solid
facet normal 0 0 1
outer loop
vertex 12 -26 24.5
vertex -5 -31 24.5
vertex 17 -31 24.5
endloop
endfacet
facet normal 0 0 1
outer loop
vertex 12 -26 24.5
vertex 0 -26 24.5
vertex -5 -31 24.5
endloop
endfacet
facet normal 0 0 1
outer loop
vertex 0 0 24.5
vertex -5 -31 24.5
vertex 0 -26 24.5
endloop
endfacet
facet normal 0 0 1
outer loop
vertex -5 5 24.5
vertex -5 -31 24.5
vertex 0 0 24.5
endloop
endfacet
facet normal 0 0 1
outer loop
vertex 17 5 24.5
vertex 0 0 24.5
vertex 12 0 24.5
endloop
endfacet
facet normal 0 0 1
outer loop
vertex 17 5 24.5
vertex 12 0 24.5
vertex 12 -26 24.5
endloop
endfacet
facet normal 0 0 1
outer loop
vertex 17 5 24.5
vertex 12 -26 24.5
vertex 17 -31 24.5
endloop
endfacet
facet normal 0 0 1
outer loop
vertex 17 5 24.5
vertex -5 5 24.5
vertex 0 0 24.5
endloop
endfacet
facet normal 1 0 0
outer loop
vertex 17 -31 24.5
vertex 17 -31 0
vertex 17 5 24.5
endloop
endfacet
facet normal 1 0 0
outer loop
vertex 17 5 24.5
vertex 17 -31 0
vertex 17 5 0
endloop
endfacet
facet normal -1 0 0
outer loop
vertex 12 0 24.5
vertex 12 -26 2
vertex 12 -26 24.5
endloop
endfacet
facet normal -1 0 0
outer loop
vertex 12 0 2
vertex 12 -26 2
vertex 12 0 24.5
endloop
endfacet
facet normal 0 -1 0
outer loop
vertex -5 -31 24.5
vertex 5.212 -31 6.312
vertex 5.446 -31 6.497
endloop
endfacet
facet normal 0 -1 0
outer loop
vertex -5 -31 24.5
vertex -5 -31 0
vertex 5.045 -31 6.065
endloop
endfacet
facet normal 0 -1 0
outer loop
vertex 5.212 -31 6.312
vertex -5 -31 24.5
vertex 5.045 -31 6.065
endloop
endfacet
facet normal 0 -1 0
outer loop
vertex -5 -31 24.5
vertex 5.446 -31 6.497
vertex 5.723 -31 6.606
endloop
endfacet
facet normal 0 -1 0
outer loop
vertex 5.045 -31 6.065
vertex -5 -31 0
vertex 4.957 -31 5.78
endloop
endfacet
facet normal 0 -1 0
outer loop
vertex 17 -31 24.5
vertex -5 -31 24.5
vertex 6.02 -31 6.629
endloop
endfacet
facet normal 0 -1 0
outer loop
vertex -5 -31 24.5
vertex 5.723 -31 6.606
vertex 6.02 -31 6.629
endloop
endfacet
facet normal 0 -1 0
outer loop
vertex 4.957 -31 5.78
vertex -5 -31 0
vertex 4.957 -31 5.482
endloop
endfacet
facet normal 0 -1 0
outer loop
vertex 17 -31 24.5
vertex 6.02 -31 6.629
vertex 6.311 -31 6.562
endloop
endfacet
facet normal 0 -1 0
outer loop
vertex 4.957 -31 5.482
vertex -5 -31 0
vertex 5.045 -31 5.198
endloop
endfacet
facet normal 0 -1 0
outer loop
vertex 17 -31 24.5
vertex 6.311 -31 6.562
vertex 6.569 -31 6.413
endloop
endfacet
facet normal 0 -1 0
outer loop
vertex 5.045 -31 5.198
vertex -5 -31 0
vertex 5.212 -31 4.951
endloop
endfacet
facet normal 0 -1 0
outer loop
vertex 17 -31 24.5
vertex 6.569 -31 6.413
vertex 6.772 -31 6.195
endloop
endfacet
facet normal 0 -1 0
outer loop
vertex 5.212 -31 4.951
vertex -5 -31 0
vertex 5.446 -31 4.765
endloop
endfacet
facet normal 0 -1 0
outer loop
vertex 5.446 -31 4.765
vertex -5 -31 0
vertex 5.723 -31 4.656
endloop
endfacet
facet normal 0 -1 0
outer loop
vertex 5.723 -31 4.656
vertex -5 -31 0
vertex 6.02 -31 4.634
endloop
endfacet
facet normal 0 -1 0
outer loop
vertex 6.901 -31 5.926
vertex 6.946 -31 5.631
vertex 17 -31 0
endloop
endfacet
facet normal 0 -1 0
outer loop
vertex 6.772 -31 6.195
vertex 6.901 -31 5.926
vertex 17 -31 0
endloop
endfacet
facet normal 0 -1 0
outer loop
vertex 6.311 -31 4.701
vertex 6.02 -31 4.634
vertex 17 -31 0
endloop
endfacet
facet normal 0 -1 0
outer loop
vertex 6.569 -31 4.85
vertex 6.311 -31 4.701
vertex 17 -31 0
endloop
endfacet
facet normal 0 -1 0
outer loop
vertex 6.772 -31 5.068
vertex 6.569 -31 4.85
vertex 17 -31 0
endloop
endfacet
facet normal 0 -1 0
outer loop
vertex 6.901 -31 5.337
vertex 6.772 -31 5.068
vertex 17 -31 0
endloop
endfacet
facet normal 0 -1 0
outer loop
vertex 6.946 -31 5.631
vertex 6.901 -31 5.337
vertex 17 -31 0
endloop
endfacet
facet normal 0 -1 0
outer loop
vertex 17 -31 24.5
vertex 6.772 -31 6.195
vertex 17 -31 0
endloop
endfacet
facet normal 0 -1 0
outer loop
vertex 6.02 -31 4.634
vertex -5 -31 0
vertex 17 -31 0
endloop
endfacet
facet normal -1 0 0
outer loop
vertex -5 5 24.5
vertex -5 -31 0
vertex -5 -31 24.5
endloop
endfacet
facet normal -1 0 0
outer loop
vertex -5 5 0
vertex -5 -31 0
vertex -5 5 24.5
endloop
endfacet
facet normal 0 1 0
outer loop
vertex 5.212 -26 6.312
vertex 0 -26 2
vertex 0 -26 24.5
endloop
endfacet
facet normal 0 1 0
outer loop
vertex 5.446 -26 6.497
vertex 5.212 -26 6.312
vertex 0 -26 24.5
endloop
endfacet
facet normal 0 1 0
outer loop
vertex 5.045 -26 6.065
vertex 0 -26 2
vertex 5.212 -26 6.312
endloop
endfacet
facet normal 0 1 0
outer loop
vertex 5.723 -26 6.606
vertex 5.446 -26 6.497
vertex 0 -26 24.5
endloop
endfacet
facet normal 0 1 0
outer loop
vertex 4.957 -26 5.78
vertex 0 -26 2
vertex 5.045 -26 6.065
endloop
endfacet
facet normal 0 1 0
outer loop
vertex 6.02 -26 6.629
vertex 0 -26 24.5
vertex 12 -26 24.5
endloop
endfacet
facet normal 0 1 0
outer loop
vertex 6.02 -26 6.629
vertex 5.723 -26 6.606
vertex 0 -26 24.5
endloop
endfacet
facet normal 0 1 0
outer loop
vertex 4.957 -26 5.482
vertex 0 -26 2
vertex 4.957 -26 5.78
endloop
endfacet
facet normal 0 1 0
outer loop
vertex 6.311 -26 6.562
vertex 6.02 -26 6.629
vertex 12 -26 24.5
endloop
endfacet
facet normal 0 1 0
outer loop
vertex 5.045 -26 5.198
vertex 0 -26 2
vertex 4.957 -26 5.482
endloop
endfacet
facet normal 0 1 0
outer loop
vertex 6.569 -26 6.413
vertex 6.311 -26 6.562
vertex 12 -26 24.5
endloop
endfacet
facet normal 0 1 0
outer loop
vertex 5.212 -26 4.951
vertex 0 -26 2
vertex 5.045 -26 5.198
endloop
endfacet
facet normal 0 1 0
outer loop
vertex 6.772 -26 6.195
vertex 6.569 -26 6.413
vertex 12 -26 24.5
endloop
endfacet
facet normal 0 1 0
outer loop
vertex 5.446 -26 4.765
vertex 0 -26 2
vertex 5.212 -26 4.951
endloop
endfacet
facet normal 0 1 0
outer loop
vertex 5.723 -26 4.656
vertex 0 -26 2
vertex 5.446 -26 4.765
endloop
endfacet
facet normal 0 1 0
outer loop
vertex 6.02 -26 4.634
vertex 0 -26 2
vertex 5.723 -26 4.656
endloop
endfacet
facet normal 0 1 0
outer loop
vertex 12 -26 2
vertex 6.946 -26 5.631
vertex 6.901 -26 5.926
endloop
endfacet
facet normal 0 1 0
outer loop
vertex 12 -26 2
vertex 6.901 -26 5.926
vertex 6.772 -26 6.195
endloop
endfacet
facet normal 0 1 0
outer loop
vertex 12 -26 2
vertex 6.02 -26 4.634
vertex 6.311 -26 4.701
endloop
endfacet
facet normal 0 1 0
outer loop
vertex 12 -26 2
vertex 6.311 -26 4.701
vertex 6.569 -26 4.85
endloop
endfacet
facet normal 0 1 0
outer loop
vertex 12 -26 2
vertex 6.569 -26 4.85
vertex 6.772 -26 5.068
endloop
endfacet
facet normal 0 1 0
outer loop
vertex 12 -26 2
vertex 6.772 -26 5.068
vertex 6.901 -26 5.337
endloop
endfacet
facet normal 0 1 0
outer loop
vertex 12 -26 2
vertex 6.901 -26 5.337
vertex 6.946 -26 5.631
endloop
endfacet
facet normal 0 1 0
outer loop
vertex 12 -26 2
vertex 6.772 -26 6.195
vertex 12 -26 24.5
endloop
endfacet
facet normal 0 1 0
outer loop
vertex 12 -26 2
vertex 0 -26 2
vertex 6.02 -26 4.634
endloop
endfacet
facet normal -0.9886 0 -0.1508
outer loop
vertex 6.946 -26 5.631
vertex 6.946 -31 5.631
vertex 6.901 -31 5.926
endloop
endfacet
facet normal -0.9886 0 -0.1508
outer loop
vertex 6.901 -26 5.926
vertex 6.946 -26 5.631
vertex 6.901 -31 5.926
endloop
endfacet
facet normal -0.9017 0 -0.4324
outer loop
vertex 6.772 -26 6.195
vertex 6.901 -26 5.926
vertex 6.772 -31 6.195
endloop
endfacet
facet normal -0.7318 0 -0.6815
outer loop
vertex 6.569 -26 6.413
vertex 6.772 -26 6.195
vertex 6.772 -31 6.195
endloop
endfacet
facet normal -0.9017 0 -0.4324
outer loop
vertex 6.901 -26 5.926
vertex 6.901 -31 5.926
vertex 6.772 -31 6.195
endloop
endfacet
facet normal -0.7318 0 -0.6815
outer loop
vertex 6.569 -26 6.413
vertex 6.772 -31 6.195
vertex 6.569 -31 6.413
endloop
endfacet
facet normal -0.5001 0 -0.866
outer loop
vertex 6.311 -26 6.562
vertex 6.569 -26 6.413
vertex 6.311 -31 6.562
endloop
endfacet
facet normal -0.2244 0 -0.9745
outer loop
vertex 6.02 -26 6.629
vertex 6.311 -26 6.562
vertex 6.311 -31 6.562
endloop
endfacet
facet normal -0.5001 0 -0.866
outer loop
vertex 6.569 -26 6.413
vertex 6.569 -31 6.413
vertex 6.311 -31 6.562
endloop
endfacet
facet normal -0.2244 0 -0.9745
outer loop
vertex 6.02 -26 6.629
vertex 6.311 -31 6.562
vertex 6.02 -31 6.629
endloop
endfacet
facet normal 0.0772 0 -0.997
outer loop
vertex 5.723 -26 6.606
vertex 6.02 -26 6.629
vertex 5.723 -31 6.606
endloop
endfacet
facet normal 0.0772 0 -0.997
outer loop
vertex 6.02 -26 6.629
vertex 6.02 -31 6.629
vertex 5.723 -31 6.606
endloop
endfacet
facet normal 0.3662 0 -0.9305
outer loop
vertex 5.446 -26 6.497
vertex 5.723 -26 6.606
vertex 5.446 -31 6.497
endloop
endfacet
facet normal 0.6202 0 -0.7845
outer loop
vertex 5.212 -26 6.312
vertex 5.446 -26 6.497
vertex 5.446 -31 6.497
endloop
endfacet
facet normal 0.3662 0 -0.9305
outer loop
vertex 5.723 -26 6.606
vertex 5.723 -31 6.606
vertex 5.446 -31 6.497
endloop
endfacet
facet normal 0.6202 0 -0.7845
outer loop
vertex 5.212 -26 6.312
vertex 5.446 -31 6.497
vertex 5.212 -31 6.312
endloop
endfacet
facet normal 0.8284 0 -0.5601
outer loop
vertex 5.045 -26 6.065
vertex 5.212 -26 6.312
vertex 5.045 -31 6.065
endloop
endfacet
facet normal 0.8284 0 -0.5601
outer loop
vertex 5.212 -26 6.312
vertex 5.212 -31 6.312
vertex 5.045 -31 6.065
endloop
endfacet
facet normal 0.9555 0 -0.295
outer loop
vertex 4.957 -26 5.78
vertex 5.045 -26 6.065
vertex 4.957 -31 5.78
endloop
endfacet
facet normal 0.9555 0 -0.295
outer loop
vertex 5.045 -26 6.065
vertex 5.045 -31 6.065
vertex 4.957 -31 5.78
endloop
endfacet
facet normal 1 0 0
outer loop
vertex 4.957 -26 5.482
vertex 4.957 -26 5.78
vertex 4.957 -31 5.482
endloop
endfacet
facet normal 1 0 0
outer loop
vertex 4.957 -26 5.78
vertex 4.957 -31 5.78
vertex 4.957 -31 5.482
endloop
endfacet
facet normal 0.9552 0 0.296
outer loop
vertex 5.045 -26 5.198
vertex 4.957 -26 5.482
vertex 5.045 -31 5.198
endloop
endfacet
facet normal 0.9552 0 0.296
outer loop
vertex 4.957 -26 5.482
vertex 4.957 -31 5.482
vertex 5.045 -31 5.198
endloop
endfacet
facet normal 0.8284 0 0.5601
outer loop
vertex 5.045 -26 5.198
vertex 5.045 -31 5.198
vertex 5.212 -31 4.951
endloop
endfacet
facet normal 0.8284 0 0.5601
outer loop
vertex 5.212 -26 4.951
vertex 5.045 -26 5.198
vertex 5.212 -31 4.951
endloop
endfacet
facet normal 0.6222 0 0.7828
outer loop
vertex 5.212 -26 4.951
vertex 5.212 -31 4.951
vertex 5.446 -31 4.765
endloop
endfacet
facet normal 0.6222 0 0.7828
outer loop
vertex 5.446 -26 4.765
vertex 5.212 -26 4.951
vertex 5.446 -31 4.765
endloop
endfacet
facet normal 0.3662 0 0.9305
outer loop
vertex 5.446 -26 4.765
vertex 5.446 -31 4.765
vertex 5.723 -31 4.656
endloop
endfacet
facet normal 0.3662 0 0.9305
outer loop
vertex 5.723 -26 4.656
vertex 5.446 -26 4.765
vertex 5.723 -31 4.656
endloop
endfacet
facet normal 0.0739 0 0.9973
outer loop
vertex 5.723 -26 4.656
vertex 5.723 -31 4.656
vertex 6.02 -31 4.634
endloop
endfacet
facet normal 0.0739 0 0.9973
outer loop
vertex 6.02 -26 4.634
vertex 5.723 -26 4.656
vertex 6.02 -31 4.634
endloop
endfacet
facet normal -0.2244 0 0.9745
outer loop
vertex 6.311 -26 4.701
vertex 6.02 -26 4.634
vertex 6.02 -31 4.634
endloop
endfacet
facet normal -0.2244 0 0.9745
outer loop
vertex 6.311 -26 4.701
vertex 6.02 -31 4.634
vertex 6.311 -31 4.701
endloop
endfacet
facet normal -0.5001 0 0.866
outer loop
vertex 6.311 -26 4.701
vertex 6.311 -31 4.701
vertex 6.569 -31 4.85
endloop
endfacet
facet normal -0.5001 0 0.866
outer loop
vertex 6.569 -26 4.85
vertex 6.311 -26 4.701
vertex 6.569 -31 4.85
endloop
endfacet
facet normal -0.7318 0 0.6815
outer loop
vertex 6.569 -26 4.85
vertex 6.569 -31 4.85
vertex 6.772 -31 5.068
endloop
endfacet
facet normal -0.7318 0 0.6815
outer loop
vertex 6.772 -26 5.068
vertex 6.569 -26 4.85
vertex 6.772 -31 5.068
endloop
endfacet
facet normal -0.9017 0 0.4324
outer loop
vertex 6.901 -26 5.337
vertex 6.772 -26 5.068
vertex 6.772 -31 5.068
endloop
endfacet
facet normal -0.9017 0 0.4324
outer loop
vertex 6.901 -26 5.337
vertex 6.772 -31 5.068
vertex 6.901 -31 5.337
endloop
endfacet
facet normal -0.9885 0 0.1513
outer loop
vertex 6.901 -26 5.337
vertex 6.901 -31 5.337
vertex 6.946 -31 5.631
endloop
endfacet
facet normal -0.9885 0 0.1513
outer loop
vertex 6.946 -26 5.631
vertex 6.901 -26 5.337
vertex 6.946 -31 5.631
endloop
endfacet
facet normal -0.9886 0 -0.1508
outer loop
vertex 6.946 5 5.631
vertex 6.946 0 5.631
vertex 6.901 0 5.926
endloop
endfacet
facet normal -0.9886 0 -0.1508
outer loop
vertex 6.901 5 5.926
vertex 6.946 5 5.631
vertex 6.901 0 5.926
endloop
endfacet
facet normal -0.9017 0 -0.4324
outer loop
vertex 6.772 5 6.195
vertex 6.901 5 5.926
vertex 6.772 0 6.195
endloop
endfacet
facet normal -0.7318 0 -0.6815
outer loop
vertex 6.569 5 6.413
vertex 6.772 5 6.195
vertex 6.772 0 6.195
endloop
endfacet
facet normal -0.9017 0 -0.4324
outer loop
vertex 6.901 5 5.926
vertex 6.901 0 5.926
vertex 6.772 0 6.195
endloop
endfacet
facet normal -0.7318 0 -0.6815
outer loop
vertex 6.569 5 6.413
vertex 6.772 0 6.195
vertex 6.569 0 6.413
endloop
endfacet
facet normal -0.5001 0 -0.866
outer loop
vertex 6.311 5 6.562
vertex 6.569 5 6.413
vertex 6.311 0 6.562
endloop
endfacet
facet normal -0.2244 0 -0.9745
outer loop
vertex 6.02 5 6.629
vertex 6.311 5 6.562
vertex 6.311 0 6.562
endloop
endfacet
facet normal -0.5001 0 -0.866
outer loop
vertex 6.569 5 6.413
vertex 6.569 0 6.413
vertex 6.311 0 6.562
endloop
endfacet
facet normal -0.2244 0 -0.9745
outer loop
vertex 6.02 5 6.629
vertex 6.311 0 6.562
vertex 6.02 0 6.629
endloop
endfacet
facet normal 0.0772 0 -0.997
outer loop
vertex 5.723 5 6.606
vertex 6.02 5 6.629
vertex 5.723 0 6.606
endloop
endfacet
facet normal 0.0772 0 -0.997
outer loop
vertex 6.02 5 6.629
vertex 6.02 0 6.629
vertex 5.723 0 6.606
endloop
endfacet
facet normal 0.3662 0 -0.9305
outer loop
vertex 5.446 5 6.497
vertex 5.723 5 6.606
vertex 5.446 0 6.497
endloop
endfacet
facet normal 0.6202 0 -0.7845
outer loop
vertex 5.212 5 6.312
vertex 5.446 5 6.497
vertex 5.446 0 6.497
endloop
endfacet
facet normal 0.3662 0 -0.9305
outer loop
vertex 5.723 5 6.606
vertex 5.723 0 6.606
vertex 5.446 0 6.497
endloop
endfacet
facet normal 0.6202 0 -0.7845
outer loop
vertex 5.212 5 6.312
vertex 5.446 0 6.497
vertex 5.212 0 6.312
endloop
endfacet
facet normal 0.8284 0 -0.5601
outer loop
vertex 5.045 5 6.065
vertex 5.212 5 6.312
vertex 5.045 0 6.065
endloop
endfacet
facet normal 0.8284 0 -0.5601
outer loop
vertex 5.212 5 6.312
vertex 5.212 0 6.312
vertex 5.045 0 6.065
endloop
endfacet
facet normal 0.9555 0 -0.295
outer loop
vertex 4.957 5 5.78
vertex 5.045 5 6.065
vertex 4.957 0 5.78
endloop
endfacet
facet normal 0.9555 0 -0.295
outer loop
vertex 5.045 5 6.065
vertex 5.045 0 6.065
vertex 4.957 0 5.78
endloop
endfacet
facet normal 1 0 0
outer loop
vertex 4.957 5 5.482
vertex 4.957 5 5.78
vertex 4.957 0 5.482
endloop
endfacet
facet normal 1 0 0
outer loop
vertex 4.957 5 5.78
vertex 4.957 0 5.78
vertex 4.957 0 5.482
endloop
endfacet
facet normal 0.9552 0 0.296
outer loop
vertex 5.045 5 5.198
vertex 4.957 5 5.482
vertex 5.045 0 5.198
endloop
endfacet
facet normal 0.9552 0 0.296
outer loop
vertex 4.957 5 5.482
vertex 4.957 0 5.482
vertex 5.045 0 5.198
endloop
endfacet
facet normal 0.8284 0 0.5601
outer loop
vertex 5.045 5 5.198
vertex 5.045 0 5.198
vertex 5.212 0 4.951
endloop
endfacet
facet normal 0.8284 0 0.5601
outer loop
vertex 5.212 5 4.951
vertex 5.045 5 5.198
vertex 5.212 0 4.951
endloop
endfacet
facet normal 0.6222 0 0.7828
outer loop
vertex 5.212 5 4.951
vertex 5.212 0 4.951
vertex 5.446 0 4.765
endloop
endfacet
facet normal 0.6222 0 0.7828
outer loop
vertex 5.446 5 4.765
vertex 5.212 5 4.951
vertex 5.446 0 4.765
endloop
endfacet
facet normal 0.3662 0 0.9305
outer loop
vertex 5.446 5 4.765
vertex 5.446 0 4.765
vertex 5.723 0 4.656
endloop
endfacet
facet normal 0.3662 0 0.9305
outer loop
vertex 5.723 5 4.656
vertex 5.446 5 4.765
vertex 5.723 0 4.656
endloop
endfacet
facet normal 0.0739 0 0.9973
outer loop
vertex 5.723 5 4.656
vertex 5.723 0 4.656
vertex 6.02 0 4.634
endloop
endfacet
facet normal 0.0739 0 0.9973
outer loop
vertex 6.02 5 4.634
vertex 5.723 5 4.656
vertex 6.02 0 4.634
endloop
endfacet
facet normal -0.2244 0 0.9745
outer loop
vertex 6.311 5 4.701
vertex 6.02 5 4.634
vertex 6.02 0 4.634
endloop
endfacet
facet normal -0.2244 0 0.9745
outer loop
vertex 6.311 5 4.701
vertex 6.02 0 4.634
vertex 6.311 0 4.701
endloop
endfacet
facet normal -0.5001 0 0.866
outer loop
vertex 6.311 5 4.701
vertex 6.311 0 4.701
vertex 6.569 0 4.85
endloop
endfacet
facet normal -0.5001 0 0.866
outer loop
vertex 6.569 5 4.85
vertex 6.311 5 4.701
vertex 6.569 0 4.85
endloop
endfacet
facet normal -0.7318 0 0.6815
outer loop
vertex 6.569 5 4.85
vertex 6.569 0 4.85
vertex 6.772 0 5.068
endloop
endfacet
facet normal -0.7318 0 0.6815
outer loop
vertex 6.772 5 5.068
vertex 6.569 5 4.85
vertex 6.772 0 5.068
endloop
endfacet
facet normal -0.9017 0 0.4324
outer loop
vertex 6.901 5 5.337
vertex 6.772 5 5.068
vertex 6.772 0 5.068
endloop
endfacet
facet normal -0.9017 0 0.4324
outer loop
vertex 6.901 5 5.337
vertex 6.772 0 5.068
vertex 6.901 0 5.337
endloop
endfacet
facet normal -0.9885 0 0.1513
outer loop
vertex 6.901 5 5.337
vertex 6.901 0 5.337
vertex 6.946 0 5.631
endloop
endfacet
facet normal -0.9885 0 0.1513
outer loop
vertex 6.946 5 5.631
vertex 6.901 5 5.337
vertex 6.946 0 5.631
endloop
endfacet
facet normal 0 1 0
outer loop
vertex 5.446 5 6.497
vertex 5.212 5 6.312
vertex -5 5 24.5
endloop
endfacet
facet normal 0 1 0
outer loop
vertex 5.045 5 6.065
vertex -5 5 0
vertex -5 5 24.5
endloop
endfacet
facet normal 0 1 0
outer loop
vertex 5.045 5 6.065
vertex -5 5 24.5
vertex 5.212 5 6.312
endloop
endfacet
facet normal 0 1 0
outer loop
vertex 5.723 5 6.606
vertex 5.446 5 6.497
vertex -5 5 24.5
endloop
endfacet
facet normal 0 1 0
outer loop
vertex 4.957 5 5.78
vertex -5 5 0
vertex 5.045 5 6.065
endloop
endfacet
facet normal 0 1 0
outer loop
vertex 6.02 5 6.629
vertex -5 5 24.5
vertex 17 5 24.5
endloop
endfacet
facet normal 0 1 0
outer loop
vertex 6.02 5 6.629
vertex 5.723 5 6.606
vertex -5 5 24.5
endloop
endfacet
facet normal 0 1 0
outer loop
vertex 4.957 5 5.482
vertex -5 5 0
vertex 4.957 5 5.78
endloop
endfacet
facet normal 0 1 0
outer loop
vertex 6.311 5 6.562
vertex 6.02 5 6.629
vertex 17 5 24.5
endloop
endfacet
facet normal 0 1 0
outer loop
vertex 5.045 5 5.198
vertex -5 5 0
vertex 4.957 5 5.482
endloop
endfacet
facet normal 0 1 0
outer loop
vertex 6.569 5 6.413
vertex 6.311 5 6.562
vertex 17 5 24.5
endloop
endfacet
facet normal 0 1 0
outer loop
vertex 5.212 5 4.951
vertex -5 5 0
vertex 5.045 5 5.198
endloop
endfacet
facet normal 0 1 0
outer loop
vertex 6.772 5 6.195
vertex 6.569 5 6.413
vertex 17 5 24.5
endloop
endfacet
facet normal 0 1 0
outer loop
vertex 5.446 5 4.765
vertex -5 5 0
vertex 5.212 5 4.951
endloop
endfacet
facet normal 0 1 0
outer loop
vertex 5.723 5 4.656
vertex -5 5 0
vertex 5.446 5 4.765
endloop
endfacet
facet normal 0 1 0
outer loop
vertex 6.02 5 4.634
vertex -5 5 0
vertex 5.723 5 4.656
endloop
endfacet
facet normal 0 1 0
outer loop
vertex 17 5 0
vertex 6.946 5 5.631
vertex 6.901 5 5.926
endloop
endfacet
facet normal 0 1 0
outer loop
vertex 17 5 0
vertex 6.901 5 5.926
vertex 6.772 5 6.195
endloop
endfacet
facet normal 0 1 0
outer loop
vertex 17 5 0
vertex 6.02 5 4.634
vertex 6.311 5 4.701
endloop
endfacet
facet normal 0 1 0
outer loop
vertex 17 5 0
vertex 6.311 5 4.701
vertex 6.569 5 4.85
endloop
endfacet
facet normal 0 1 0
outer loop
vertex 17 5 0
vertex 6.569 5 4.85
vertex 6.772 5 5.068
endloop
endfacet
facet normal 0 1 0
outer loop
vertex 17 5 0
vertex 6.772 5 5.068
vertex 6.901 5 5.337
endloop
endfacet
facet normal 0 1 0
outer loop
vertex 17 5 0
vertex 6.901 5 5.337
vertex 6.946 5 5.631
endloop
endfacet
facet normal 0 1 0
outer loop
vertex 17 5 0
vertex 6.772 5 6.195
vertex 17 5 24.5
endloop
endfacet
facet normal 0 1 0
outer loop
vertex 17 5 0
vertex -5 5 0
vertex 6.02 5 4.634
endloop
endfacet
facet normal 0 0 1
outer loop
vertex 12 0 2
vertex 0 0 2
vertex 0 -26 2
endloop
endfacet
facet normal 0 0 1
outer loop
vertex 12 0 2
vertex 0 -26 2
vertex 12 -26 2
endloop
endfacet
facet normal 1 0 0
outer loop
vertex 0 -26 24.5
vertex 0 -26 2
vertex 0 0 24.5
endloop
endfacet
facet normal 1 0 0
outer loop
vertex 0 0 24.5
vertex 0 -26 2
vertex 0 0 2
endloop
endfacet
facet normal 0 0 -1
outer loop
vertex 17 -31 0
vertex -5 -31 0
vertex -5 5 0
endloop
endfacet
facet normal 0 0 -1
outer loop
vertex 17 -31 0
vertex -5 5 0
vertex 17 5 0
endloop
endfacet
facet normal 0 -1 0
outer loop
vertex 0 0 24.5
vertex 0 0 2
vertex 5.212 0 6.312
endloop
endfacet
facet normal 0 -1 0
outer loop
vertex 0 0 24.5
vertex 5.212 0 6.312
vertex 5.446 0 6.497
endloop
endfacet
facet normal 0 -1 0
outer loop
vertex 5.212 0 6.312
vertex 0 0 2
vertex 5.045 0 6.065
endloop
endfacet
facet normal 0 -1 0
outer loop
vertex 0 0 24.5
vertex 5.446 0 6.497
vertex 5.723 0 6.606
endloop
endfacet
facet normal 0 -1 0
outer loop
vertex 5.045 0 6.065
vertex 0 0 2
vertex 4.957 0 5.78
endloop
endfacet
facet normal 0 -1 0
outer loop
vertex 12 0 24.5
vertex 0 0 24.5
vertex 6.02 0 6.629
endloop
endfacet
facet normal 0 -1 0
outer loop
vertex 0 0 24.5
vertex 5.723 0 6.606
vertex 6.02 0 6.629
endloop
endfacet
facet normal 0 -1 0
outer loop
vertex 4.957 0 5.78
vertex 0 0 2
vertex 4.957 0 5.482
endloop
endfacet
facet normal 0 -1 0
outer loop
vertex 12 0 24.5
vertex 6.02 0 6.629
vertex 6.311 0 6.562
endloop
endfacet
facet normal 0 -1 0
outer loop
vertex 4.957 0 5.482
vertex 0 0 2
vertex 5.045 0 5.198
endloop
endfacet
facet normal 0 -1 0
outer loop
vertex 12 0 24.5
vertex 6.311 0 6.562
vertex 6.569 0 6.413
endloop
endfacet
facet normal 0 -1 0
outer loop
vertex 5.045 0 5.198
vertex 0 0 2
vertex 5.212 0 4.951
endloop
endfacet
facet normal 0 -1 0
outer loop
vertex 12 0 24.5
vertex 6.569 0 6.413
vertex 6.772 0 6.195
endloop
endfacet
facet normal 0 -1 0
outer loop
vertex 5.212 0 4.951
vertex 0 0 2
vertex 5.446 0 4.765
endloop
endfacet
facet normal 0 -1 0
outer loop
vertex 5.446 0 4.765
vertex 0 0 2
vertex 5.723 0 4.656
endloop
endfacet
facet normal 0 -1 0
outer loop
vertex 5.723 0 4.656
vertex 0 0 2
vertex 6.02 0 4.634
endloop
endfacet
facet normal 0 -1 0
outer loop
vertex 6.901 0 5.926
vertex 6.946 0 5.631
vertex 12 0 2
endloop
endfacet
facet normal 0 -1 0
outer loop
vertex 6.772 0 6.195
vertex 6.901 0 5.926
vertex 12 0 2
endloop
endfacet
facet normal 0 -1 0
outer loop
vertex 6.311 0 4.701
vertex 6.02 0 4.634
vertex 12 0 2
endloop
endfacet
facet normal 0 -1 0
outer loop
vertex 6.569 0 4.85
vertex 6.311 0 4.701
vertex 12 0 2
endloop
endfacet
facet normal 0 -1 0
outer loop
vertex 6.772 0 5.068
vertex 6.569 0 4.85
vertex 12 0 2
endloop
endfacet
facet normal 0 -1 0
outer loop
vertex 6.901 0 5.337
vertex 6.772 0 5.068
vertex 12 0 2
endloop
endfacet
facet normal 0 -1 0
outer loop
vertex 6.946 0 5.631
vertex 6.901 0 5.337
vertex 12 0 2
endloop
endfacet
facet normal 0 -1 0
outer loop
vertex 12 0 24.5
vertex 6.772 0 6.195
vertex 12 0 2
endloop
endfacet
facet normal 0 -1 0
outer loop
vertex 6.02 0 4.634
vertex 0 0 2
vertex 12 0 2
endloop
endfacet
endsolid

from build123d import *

# Parameters (mm, degrees)
F0_W     = 22
F0_H     = 36
F0_W_2   = 12
F0_H_2   = 26
F1_DEPTH = 24.5
F2_DEPTH = 2
F3_R     = 1
F4_DEPTH = 36.001


with BuildPart() as f1:
    # F0 (on Top) → F1 (new body)
    with BuildSketch(Plane.XY):
        with Locations((6, -13)):
            Rectangle(F0_W, F0_H)
        with Locations((6, -13)):
            Rectangle(F0_W_2, F0_H_2, mode=Mode.SUBTRACT)
    extrude(amount=F1_DEPTH)

    # F0 (on Top) → F2 (join)
    with BuildSketch(Plane.XY):
        with Locations((6, -13)):
            Rectangle(F0_W_2, F0_H_2)
    extrude(amount=F2_DEPTH)

    # F3 (on face) → F4 (cut, through all)
    with BuildSketch(Plane.XZ.offset(31)):
        with Locations((5.945511, 5.631423)):
            Circle(F3_R)
    extrude(amount=-F4_DEPTH, mode=Mode.SUBTRACT)


solid = f1.part
